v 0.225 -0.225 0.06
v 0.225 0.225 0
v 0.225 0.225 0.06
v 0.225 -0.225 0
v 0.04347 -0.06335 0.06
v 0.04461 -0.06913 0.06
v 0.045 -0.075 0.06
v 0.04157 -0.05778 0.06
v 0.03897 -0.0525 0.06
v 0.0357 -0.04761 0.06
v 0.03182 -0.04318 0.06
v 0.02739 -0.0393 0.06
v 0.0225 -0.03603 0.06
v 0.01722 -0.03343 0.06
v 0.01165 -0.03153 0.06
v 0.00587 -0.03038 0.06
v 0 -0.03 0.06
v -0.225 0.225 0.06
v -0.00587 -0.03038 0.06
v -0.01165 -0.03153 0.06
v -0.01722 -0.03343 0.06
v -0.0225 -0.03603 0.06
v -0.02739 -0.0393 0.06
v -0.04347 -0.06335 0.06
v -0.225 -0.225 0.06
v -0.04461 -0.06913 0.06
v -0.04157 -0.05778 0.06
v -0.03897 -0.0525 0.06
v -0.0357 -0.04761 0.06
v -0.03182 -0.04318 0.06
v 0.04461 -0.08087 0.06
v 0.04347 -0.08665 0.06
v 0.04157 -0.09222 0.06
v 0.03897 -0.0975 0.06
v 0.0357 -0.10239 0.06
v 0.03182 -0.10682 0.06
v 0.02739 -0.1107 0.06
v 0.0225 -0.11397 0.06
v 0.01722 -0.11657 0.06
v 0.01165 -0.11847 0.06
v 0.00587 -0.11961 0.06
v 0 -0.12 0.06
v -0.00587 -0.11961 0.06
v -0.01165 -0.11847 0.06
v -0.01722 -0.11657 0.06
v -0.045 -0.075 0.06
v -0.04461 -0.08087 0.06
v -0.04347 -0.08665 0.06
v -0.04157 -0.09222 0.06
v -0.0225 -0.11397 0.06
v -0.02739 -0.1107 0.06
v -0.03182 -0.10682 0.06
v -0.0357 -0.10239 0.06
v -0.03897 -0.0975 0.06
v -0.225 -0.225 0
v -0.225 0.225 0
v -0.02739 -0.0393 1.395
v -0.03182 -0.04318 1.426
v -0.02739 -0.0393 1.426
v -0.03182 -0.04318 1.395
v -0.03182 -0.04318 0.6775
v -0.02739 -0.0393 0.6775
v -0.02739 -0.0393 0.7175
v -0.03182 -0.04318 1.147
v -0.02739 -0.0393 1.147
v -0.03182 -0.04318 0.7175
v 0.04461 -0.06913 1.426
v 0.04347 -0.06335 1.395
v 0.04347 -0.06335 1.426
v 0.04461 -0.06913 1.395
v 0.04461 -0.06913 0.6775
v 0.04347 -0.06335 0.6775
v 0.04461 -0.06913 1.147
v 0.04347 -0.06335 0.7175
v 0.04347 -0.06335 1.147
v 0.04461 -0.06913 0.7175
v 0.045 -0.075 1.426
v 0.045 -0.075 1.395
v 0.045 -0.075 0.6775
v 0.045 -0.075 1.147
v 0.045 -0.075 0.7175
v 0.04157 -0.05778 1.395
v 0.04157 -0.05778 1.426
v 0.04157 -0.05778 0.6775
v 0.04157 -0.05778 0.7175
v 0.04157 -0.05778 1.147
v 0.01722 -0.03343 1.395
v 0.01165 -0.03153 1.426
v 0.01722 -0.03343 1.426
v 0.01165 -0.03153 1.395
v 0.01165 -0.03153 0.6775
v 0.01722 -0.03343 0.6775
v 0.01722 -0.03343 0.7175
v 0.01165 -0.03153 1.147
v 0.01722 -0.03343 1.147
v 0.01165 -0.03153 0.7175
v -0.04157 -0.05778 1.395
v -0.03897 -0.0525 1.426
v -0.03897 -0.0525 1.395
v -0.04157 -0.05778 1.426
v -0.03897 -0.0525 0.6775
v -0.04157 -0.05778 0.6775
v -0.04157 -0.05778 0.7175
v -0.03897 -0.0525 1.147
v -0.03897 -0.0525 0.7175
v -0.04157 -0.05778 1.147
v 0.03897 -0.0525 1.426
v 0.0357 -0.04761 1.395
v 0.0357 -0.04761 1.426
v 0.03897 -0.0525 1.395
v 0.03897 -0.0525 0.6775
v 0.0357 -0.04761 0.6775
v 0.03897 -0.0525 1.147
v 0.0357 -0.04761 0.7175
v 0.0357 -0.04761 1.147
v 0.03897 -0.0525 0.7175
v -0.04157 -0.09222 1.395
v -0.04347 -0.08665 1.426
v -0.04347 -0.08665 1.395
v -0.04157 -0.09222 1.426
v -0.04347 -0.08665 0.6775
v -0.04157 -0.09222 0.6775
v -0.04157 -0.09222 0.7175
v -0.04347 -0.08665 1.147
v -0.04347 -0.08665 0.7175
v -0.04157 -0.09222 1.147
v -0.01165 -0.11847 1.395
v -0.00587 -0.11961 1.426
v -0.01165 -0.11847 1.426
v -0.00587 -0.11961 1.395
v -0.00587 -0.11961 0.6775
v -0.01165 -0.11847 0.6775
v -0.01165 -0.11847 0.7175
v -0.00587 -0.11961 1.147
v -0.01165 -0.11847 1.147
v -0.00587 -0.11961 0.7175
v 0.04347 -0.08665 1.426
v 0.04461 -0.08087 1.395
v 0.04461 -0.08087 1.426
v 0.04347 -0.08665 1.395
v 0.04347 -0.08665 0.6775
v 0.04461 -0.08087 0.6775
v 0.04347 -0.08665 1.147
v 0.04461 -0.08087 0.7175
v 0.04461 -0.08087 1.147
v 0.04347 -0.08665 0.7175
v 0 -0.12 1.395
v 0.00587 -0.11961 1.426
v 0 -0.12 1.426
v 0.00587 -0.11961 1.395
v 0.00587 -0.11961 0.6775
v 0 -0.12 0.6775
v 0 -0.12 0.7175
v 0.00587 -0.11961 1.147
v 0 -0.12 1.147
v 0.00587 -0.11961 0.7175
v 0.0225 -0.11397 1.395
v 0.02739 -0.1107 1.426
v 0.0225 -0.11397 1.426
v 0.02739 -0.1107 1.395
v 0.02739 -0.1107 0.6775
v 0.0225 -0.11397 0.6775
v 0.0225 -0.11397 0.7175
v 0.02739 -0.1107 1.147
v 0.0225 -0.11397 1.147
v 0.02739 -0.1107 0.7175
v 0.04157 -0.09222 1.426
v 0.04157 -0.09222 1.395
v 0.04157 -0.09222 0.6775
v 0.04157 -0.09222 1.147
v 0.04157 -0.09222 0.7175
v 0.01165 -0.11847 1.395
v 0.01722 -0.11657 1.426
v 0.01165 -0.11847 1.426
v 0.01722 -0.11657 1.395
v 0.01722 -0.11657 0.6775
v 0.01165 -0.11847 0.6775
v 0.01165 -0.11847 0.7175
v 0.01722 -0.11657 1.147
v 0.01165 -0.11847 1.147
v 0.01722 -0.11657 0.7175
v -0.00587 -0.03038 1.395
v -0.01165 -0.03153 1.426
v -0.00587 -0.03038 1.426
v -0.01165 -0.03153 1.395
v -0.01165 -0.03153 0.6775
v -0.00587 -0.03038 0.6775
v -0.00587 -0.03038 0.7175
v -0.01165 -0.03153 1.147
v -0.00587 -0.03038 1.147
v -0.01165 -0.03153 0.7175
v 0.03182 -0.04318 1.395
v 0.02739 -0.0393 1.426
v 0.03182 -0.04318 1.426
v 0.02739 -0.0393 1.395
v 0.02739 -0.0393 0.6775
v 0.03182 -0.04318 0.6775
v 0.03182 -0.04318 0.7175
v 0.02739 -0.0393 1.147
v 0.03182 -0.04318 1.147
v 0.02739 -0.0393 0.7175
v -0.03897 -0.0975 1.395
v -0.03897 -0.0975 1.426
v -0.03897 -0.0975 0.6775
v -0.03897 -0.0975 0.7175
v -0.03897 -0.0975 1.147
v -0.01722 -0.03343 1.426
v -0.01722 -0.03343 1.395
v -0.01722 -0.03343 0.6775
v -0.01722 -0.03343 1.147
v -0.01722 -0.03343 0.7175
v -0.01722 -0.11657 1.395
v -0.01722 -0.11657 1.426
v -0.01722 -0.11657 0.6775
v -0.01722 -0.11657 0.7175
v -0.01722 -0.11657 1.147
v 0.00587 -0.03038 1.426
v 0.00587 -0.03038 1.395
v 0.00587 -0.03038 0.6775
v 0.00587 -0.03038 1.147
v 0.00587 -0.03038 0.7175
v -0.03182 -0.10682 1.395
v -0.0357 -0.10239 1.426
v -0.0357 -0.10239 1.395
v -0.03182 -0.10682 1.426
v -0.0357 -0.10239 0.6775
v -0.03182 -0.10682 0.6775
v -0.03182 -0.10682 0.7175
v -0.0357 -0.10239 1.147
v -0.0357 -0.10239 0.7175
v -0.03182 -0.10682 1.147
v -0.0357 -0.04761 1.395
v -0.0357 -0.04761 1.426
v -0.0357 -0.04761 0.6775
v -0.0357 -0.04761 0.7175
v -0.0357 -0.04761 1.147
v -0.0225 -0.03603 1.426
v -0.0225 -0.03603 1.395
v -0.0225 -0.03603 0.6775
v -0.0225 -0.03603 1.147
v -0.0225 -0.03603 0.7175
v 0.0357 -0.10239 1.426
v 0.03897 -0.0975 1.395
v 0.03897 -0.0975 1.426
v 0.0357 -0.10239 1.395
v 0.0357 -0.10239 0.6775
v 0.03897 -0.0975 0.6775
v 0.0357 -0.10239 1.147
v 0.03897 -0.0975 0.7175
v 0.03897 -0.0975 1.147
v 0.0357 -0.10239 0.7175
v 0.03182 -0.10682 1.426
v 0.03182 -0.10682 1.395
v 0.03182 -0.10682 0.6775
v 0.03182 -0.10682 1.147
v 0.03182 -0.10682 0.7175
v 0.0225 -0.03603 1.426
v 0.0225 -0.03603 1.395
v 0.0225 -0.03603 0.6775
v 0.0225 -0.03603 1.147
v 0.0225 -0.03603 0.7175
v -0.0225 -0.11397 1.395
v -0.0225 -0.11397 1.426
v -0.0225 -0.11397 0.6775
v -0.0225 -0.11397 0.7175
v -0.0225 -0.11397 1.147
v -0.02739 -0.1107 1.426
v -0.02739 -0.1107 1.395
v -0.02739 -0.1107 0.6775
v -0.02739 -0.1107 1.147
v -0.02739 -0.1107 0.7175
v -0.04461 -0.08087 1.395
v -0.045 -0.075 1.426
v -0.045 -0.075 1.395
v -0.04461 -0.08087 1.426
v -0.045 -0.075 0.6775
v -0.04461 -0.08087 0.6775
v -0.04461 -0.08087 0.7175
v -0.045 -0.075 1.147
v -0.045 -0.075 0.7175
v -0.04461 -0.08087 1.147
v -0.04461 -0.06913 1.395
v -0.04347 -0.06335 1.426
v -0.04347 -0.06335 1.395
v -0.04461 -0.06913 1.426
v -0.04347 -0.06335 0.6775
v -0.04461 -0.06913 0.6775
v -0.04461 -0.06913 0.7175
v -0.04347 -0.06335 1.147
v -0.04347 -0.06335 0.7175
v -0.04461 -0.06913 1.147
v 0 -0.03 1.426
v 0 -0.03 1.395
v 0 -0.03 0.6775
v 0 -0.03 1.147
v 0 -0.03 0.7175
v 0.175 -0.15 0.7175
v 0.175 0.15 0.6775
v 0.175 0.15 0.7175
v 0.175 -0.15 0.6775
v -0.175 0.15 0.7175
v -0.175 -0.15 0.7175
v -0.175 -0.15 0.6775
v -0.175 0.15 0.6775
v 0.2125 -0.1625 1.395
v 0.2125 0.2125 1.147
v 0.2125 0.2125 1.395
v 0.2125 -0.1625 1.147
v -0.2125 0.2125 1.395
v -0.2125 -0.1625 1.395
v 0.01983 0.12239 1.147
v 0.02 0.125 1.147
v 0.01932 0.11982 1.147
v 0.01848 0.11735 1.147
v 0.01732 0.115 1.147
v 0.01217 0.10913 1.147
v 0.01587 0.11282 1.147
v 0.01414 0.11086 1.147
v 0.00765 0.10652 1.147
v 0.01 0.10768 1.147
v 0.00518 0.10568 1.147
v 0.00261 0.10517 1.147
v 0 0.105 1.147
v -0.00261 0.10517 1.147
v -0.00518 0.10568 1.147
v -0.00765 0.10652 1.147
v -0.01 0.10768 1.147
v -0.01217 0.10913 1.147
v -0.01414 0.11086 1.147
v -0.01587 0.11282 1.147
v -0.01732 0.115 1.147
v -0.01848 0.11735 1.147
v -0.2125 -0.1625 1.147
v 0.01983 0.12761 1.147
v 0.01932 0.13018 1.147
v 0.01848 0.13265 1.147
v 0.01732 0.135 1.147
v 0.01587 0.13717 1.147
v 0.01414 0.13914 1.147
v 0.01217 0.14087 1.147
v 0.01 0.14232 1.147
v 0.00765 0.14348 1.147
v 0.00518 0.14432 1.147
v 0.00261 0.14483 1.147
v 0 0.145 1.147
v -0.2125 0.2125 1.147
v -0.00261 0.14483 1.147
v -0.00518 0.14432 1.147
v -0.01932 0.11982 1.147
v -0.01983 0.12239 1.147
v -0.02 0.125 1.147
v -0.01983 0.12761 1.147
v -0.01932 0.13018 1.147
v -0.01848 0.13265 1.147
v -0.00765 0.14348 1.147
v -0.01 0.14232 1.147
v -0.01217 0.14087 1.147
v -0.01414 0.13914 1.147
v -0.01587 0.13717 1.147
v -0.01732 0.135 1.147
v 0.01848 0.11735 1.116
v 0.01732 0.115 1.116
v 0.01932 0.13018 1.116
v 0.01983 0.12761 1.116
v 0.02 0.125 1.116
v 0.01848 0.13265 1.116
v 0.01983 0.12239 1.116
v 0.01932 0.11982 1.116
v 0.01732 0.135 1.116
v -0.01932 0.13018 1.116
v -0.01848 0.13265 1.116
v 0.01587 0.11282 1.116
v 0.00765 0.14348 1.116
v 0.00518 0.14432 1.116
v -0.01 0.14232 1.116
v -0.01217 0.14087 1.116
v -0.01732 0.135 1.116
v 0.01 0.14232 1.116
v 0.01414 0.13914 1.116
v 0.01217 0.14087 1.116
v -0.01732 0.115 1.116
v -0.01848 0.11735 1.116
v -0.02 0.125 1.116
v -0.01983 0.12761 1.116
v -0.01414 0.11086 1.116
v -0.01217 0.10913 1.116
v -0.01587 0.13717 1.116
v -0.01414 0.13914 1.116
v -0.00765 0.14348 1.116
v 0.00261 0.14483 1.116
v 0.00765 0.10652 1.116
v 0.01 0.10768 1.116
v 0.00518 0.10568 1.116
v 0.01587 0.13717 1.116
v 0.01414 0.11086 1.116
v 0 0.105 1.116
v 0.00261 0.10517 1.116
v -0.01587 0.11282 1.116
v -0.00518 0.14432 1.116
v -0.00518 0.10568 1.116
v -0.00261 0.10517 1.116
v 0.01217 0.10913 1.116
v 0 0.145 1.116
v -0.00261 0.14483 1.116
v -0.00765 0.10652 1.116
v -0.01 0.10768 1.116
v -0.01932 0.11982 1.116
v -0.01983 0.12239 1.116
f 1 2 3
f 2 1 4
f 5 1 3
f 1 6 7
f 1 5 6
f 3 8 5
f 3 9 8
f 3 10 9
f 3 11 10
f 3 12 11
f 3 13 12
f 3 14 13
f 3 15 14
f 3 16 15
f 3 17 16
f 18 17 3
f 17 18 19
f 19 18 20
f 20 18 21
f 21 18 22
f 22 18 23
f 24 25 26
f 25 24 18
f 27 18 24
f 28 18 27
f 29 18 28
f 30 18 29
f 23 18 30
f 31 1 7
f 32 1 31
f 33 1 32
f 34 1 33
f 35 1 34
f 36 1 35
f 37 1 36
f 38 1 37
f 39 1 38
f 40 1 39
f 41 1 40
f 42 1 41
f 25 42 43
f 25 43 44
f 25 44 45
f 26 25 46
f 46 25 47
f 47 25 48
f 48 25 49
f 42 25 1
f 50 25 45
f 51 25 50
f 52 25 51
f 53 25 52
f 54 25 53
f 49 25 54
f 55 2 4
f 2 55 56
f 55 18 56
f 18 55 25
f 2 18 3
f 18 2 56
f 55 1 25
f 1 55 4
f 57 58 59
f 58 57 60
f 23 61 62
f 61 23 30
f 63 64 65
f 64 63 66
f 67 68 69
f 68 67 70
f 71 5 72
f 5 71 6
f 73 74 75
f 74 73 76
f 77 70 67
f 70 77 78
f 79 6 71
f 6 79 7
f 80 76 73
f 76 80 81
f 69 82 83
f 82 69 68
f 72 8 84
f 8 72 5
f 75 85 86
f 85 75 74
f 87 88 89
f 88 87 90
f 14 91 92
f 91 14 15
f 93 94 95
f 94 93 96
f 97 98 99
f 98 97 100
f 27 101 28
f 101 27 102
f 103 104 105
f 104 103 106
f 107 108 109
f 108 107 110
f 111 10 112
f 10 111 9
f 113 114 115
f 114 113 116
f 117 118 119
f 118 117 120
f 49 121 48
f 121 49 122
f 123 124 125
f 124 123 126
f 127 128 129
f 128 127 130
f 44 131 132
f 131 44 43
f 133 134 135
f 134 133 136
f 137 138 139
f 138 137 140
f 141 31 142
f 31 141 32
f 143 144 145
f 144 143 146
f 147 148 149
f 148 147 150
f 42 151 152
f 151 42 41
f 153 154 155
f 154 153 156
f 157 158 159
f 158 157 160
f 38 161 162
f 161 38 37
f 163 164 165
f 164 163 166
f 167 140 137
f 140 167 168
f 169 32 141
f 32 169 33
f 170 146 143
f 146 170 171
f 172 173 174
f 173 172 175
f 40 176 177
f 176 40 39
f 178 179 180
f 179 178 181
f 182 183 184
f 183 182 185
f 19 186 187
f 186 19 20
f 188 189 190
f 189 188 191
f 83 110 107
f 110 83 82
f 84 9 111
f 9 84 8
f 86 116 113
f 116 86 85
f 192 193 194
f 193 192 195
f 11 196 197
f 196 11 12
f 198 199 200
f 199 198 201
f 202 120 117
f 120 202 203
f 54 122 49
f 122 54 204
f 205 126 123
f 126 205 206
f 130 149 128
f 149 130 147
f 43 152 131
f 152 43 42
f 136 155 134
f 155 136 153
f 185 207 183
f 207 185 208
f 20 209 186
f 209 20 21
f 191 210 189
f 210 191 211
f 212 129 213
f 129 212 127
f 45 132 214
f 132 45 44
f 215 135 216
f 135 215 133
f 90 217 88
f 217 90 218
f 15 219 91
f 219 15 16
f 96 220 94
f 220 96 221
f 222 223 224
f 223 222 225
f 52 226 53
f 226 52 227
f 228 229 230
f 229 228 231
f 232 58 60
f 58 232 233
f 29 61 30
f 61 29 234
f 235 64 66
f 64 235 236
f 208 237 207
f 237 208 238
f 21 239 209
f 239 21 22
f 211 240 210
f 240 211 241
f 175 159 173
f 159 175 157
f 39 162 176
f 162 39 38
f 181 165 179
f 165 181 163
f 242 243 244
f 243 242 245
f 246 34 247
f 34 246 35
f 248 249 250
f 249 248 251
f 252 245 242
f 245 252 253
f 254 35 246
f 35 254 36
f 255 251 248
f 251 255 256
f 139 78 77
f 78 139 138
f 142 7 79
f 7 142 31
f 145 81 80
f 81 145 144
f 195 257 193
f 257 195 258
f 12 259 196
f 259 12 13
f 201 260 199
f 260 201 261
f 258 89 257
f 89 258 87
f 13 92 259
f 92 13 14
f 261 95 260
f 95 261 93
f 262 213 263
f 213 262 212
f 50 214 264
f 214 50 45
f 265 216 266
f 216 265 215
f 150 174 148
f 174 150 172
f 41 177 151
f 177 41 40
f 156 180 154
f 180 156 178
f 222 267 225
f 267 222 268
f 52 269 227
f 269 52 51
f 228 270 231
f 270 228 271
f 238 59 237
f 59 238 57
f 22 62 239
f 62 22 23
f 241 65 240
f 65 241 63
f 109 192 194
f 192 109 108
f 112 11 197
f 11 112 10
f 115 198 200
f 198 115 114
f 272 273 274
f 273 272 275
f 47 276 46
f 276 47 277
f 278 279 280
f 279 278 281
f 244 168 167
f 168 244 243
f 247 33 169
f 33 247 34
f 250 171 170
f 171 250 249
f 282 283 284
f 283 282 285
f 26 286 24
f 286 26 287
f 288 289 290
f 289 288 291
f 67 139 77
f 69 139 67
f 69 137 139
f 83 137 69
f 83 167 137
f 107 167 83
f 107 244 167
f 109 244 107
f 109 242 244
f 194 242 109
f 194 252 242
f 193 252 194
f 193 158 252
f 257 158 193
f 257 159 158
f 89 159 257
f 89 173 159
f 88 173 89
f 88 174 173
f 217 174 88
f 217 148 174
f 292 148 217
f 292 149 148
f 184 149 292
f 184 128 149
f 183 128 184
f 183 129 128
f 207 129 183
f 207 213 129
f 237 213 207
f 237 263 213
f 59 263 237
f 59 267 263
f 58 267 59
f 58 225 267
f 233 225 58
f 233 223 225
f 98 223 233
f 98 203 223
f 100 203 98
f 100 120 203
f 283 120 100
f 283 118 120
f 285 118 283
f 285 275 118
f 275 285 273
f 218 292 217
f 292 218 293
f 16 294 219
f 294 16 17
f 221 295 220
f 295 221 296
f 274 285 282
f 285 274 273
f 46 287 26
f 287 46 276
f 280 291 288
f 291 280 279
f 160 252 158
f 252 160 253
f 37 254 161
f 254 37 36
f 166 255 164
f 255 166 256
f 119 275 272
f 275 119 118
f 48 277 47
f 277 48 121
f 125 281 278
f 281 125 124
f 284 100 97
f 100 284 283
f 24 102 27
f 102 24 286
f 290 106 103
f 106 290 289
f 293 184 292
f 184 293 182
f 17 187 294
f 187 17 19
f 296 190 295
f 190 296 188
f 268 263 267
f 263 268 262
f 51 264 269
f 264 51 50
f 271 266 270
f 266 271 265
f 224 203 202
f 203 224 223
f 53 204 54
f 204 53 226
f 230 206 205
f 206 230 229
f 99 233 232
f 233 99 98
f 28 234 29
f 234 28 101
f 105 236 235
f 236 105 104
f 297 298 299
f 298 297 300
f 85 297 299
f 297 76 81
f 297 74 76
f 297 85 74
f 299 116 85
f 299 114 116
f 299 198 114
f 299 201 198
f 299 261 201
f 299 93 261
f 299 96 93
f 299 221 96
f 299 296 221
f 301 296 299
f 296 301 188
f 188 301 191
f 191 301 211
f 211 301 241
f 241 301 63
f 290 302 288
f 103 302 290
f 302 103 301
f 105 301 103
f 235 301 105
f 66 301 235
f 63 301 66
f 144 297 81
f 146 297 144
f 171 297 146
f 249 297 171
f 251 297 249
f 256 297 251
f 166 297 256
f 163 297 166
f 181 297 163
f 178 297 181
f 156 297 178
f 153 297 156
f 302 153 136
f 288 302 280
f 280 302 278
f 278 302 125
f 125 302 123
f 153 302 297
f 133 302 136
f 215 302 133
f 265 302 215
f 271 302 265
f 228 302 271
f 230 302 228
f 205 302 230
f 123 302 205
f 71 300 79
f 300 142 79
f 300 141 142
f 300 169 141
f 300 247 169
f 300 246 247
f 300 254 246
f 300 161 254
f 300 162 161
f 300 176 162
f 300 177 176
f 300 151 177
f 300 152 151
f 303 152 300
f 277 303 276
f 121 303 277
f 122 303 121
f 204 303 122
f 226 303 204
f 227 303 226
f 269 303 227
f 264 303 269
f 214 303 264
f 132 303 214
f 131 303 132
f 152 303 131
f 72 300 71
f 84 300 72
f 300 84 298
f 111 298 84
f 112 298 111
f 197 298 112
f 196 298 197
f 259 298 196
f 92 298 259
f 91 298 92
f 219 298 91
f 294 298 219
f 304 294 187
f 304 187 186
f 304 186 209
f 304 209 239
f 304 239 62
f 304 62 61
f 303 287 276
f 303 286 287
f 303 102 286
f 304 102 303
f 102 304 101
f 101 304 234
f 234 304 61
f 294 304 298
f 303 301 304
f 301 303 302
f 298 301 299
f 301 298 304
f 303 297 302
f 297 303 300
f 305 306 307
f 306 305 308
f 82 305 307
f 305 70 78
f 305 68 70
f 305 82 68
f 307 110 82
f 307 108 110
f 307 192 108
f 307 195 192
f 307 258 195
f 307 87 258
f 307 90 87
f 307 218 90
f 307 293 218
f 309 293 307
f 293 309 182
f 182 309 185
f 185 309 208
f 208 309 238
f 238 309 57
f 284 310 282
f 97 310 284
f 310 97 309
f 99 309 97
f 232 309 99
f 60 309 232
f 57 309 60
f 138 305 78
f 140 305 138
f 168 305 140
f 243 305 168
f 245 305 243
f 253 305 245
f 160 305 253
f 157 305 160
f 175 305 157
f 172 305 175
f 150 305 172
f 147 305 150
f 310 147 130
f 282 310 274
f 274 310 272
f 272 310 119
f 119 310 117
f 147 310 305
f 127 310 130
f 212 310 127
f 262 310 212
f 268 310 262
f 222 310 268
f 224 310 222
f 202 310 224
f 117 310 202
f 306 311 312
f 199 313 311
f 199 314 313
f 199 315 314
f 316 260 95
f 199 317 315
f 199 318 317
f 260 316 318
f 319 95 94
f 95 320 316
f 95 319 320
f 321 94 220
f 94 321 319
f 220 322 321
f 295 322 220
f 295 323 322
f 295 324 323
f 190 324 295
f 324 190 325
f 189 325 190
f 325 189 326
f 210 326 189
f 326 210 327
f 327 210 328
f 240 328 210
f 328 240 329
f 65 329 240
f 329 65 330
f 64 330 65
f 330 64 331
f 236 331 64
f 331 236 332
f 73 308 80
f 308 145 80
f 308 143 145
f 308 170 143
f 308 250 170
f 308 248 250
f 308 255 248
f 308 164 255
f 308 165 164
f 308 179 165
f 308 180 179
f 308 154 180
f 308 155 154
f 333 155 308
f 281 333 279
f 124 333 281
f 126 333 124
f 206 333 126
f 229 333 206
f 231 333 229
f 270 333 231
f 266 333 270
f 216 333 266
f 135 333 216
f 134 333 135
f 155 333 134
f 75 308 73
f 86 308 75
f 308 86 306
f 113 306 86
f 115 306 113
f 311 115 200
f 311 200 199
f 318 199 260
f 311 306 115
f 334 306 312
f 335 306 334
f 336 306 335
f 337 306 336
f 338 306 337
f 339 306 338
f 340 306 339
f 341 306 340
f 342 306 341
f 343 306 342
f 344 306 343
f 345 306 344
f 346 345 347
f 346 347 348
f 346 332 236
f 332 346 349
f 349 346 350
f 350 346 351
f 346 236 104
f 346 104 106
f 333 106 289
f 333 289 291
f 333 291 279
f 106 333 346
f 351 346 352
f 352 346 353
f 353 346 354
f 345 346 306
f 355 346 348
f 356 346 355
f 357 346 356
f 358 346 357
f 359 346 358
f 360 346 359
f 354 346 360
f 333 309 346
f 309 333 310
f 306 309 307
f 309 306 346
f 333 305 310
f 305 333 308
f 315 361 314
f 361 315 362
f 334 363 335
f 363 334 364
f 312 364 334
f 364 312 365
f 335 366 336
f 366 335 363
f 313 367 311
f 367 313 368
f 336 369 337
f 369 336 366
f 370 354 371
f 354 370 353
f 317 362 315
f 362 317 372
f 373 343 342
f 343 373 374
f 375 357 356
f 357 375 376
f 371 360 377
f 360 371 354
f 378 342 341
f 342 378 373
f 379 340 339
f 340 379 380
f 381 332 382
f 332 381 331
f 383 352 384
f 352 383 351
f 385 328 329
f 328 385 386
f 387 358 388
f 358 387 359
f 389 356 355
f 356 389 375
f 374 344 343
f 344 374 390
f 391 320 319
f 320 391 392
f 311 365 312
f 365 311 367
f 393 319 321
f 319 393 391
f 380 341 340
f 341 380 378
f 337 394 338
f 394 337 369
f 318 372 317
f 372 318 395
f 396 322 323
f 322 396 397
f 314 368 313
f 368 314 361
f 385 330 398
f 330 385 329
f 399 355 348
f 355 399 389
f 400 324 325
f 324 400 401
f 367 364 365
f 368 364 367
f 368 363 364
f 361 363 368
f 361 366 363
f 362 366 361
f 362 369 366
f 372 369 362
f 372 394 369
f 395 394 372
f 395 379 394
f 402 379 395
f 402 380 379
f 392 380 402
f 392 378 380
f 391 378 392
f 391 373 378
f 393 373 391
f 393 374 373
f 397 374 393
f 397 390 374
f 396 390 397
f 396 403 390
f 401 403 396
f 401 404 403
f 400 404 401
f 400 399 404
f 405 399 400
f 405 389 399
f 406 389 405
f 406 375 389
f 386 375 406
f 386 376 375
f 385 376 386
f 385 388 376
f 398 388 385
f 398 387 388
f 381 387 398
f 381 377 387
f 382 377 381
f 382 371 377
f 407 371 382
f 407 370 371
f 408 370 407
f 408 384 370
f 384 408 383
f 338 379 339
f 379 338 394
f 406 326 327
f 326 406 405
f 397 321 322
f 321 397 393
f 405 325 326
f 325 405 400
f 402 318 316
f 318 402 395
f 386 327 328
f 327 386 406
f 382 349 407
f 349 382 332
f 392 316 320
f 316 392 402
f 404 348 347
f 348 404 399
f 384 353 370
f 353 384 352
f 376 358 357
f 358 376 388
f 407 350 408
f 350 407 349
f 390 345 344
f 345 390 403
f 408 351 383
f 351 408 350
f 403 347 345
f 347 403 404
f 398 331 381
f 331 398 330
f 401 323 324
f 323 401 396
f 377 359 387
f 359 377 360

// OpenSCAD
$fn=48;
module drillpress_crude(w,d,h){
  base=min(w,d);
  translate([0,0,0.03]) cube([base*0.9,d*0.9,0.06],center=true);
  translate([0,-d*0.15,0]) cylinder(h=h*0.92,r=base*0.09);
  translate([0,0,h*0.45]) cube([base*0.7,d*0.6,0.04],center=true);
  translate([0,d*0.05,h*0.82]) cube([base*0.85,d*0.75,h*0.16],center=true);
  translate([0,d*0.25,h*0.72]) cylinder(h=h*0.12,r=0.02);
}
color([0.62,0.64,0.68]) drillpress_crude(0.5,0.5,1.55);
